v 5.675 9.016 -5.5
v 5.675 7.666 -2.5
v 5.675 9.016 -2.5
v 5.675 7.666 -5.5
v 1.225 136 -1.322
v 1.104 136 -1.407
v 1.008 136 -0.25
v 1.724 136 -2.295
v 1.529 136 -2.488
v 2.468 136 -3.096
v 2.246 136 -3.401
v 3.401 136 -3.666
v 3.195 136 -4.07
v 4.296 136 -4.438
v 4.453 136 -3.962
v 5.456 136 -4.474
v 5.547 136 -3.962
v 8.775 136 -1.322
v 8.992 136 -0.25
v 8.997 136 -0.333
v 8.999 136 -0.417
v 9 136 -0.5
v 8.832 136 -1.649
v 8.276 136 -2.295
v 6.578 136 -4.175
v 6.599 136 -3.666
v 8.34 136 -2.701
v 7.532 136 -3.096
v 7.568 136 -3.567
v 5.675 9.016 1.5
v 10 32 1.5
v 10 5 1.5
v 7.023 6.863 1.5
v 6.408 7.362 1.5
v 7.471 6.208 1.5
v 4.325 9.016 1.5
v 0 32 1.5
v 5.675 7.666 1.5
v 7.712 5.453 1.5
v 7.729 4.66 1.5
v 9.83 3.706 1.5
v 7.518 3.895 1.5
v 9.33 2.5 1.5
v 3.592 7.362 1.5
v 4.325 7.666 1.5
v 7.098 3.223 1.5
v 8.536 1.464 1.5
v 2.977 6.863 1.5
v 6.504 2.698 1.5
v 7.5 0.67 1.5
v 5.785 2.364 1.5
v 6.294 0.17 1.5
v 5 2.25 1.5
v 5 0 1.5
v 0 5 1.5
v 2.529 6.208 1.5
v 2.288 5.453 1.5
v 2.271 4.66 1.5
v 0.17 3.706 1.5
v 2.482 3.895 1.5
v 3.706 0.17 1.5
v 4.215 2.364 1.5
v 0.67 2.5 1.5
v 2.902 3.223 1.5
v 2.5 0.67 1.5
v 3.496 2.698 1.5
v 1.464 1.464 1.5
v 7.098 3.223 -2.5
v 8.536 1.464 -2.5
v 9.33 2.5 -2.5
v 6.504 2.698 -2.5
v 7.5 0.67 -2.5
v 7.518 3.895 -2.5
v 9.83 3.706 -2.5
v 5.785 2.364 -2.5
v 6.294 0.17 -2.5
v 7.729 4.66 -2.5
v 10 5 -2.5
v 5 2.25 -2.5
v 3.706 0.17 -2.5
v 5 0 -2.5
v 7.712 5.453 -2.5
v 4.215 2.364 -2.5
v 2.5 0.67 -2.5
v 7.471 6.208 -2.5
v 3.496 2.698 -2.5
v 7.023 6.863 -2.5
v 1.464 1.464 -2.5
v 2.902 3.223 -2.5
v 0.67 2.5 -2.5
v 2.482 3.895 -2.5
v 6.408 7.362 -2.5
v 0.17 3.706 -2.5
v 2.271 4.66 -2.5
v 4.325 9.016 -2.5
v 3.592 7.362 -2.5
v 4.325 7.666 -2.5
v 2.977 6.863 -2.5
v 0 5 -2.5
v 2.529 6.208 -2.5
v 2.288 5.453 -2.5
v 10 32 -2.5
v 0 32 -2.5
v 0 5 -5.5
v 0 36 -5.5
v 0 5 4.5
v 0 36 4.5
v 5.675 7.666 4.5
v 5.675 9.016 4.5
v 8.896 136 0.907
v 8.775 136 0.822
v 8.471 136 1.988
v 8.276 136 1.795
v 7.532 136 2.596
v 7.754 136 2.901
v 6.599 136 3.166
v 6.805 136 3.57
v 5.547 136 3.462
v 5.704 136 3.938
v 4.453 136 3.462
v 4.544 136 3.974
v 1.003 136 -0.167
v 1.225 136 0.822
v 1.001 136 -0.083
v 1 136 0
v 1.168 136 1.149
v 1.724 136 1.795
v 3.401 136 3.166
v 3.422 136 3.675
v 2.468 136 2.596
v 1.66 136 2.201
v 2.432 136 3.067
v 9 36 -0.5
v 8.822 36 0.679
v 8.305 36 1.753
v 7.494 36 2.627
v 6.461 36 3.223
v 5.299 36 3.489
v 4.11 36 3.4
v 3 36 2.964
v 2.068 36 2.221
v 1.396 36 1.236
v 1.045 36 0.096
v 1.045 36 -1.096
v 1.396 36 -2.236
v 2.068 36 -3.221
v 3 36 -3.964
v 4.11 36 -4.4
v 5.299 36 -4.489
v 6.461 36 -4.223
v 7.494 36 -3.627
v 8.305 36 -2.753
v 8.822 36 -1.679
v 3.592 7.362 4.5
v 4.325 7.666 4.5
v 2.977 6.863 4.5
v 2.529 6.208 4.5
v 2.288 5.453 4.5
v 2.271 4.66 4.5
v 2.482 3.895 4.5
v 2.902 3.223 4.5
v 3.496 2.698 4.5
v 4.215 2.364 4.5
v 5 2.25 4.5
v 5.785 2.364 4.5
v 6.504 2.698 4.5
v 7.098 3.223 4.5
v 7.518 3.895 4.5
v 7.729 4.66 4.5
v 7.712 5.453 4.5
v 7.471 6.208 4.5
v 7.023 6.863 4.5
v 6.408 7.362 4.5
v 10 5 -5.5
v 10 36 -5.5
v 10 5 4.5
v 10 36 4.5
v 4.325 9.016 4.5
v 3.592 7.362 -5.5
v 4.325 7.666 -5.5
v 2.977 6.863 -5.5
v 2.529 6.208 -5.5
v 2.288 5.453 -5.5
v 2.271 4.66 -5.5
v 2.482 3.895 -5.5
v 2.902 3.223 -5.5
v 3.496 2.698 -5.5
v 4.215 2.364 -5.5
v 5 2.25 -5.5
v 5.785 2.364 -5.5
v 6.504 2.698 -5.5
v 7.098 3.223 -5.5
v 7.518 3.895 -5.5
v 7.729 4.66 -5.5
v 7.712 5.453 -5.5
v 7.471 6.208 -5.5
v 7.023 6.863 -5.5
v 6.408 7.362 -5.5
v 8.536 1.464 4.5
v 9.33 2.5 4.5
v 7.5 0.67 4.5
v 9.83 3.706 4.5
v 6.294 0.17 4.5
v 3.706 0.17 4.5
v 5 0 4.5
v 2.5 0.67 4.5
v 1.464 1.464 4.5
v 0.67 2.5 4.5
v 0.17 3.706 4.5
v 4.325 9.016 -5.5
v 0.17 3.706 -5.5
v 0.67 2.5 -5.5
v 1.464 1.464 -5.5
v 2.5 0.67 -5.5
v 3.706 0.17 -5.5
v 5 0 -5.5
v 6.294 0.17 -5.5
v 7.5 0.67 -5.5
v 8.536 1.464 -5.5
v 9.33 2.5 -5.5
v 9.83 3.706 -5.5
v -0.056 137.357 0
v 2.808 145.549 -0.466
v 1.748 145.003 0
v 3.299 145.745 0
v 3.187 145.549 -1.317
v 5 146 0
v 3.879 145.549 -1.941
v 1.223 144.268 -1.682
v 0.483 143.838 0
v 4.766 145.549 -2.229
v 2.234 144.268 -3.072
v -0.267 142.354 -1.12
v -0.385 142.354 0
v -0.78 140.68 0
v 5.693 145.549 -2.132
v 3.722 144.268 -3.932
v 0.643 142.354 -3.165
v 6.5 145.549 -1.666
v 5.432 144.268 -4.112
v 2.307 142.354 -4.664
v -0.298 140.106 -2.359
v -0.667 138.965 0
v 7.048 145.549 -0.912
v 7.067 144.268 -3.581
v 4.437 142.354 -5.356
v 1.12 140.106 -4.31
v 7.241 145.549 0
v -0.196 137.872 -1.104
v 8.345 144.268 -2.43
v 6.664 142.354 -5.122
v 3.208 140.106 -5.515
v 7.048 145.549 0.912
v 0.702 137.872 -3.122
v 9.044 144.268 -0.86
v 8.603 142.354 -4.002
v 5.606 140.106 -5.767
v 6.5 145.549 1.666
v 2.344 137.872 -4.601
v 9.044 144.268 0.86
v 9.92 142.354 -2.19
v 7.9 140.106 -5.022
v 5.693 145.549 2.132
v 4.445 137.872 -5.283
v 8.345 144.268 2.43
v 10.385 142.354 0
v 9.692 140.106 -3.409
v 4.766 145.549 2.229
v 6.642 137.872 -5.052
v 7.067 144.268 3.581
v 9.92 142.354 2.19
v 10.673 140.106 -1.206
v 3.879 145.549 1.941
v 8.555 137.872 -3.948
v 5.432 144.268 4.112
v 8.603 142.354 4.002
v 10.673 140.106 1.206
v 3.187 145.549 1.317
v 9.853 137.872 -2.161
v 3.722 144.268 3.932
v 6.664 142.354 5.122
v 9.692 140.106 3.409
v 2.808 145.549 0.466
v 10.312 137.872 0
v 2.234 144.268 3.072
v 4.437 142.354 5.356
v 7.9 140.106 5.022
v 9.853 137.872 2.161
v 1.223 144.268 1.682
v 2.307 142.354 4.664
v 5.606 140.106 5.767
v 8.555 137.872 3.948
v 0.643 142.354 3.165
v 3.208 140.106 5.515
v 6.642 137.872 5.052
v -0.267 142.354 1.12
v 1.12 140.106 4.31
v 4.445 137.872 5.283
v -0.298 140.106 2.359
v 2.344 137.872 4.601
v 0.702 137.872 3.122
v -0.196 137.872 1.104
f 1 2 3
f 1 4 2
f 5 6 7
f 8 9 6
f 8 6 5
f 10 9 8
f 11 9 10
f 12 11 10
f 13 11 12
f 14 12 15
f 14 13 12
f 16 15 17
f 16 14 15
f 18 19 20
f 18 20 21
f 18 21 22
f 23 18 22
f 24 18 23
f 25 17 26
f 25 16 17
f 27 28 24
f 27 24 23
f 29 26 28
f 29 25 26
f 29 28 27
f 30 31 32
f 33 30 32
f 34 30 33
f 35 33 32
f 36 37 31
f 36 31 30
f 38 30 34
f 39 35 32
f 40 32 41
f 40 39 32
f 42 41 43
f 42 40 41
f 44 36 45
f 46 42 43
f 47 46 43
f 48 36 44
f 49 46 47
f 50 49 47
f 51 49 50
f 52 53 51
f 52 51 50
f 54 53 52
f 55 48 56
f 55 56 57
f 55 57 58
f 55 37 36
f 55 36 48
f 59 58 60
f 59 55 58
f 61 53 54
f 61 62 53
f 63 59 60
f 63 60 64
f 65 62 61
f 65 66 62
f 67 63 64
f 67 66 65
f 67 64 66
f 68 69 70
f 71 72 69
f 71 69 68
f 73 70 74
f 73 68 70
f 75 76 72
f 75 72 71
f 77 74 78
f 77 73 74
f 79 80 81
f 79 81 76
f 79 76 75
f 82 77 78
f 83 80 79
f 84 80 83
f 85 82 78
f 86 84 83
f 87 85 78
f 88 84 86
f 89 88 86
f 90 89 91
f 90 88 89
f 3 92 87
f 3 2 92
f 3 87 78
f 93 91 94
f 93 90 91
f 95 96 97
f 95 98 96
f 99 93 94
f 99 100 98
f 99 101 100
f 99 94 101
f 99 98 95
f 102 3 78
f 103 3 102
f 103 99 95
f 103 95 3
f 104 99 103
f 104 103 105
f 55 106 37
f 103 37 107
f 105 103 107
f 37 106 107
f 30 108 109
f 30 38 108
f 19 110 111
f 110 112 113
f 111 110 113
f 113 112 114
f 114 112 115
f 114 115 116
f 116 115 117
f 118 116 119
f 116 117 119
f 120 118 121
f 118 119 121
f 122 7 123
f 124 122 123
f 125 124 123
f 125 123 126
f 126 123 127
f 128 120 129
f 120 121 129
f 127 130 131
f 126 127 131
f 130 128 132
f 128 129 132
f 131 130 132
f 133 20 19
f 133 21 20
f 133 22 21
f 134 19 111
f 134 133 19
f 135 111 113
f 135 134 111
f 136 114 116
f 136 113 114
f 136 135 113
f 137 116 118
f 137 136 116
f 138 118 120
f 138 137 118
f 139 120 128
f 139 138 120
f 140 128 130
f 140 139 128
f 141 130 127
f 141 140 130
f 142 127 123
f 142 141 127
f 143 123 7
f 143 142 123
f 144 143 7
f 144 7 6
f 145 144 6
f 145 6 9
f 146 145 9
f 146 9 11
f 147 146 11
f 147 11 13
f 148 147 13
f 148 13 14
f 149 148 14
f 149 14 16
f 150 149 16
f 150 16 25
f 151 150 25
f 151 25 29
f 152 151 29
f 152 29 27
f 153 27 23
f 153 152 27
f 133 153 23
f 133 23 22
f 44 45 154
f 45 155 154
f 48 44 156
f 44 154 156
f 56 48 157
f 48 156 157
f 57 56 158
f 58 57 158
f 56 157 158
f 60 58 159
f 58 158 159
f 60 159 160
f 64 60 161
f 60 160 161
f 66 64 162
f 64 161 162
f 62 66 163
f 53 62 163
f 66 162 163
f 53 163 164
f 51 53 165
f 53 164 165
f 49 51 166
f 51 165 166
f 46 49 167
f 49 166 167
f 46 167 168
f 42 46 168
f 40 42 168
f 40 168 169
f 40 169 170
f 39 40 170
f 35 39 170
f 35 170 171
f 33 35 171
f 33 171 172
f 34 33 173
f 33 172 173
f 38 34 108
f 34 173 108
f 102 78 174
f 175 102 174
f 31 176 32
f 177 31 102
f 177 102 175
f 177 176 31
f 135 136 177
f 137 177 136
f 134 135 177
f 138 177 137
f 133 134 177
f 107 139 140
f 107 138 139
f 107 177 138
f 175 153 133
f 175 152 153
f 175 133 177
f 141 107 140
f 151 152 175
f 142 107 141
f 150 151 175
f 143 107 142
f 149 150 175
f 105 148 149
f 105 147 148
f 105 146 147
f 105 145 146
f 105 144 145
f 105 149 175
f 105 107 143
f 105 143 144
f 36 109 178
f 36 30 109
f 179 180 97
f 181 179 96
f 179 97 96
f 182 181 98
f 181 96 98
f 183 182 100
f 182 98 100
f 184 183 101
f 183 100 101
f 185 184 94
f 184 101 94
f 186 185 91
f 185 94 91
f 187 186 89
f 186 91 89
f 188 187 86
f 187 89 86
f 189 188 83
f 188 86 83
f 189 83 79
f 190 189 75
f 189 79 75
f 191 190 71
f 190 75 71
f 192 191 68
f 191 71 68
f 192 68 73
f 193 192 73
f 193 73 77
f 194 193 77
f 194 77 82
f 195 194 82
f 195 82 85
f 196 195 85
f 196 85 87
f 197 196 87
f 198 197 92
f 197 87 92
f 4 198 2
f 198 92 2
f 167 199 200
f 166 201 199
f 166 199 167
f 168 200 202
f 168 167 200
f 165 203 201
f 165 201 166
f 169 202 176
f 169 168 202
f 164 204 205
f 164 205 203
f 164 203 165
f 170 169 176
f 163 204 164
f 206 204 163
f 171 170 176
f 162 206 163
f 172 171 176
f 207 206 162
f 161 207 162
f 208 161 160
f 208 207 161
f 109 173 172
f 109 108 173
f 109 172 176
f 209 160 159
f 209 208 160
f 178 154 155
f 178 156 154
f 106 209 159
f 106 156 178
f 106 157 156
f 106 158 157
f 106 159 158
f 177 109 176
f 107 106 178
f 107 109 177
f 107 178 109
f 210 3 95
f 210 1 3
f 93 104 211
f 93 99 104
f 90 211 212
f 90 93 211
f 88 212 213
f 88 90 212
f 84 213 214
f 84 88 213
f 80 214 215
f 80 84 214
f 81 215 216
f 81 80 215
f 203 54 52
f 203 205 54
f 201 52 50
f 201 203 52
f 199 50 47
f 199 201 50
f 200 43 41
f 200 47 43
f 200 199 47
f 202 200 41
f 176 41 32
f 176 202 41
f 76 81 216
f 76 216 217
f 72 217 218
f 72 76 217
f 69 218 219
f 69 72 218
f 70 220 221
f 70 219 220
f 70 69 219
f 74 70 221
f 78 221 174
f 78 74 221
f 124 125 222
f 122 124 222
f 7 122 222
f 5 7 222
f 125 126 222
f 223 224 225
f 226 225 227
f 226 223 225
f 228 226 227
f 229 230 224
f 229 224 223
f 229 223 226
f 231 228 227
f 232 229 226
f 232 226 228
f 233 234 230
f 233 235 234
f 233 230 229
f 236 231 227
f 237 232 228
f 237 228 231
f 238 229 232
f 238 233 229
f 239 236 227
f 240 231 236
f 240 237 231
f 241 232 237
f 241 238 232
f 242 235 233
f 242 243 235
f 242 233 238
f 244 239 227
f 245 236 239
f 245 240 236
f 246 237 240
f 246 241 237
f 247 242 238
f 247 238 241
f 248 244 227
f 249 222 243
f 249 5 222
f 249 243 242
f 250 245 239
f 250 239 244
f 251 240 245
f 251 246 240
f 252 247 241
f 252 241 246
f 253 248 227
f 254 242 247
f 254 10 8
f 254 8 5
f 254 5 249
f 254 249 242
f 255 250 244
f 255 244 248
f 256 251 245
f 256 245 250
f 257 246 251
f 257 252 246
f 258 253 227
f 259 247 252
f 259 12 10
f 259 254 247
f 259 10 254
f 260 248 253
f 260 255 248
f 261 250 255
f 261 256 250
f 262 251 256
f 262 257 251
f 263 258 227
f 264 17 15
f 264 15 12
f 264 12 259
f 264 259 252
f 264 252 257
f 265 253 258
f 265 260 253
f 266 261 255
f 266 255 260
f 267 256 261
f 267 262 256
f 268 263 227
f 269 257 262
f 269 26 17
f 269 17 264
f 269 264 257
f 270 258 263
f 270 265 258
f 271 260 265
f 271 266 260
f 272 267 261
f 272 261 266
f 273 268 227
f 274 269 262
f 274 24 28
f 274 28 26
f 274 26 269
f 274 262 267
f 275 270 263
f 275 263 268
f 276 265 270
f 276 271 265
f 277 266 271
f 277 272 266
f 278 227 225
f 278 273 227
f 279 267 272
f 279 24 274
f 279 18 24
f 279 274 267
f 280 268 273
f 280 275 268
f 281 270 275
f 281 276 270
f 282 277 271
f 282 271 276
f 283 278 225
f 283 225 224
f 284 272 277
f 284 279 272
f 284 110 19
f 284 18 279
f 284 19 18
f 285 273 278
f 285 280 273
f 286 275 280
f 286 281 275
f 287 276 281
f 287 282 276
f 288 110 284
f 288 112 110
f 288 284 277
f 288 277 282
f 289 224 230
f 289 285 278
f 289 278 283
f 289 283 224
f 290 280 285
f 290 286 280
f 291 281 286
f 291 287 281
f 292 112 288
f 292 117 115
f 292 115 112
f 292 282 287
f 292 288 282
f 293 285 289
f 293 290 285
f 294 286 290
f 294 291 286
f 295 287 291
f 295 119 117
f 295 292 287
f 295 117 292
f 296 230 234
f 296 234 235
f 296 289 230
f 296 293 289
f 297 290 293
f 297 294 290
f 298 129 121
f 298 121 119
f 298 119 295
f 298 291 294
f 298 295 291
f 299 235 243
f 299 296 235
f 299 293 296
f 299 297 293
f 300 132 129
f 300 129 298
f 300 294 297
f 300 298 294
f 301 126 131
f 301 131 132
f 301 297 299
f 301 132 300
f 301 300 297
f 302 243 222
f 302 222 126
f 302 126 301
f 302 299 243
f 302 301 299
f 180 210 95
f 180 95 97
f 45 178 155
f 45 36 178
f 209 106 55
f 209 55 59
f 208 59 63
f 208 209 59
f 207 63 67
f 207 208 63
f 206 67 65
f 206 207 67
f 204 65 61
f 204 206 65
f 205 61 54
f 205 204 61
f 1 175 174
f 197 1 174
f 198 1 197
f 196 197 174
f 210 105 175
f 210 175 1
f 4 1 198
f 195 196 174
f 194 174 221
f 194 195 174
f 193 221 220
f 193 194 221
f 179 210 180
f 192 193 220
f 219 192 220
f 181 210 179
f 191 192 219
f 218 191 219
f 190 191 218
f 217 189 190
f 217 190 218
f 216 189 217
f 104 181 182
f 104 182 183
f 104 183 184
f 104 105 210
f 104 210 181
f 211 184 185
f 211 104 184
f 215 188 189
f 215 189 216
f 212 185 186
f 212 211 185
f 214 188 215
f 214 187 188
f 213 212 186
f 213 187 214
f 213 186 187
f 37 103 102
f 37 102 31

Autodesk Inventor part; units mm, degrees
ref_plane "YZ Plane" through (0, 0, 0) normal (1, 0, 0) x (0, 1, 0)
ref_plane "XZ Plane" through (0, 0, 0) normal (0, 1, 0) x (-1, 0, 0)
ref_plane "XY Plane" through (0, 0, 0) normal (0, 0, 1) x (1, 0, 0)
sketch "Sketch1" plane through (0, 0, 0) normal (1, 0, 0) x (0, 1, 0)
  line L0 (0, 4.5) -> (36, 4.5)
  line L1 (36, 4.5) -> (36, -5.5)
  line L2 (36, -5.5) -> (0, -5.5)
  line L3 (0, -5.5) -> (0, -2.5)
  line L4 (0, -2.5) -> (32, -2.5)
  line L5 (32, -2.5) -> (32, 1.5)
  line L6 (32, 1.5) -> (0, 1.5)
  line L7 (0, 1.5) -> (0, 4.5)
  point P0 (0, 0)
  dimension "d0" = 3
  dimension "d1" = 32
  dimension "d2" = 4
  dimension "d3" = 4
  dimension "d11" = 2.5
  dimension "d12" = 0
extrude "Extrusion1" add sketch "Sketch1" along normal blind 10
sketch "Sketch2" plane through (0, 36, 4.5) normal (0, 1, 0) x (1, 0, 0)
  circle A0 centre (5, 5) radius 4
  line L0 (0, 0) -> (0, 10) projected
  line L1 (0, 10) -> (10, 10) projected
  point P0 (0, 4.5)
  dimension "d6" = 8
  dimension "d7" = 5
  dimension "d8" = 5
extrude "Extrusion2" add sketch "Sketch2" along normal blind 100
sketch "Sketch3" plane through (0, 0, 0) normal (0, 0, 1) x (1, 0, 0)
  line L0 (9, 136) -> (1, 136) projected
  line L1 (1, 136) -> (5, 136)
  line L2 (5, 136) -> (5, 146)
  arc A0 (5, 146) -> (1, 136) centre (5, 140.2) ccw
  point P0 (0, 0)
  dimension "d13" = 10
revolve "Revolution1" add sketch "Sketch3" angle 360 about axis through (5, 136, 0) along (0, 1, 0)
fillet "Fillet1" radius 5 4 edges at (0, 0, -4) (10, 0, -4) (10, 0, 3) (0, 0, 3)
hole "Hole1" at (5, 5, -5.5) direction (0, 0, 1) diameter 5.5 end through all
sketch "Sketch4" plane through (10, 36, -5.5) normal (0, 0, -1) x (-1, 0, 0)
  circle A0 centre (5, -31) radius 2.75 projected
  line L0 (4.325, -28.3341) -> (4.325, -26.9841)
  line L1 (4.325, -26.9841) -> (5.675, -26.9841)
  line L2 (5.675, -26.9841) -> (5.675, -28.3341)
  line L3 (4.325, -28.3341) -> (5.675, -28.3341)
  point P0 (10, -36)
  dimension "d25" = 1.35
  dimension "d26" = 0.675
  dimension "d27" = 1.35
extrude "Extrusion3" cut sketch "Sketch4" against normal through all contours A0 L0 L1 L2
properties part number "EndJoint"
